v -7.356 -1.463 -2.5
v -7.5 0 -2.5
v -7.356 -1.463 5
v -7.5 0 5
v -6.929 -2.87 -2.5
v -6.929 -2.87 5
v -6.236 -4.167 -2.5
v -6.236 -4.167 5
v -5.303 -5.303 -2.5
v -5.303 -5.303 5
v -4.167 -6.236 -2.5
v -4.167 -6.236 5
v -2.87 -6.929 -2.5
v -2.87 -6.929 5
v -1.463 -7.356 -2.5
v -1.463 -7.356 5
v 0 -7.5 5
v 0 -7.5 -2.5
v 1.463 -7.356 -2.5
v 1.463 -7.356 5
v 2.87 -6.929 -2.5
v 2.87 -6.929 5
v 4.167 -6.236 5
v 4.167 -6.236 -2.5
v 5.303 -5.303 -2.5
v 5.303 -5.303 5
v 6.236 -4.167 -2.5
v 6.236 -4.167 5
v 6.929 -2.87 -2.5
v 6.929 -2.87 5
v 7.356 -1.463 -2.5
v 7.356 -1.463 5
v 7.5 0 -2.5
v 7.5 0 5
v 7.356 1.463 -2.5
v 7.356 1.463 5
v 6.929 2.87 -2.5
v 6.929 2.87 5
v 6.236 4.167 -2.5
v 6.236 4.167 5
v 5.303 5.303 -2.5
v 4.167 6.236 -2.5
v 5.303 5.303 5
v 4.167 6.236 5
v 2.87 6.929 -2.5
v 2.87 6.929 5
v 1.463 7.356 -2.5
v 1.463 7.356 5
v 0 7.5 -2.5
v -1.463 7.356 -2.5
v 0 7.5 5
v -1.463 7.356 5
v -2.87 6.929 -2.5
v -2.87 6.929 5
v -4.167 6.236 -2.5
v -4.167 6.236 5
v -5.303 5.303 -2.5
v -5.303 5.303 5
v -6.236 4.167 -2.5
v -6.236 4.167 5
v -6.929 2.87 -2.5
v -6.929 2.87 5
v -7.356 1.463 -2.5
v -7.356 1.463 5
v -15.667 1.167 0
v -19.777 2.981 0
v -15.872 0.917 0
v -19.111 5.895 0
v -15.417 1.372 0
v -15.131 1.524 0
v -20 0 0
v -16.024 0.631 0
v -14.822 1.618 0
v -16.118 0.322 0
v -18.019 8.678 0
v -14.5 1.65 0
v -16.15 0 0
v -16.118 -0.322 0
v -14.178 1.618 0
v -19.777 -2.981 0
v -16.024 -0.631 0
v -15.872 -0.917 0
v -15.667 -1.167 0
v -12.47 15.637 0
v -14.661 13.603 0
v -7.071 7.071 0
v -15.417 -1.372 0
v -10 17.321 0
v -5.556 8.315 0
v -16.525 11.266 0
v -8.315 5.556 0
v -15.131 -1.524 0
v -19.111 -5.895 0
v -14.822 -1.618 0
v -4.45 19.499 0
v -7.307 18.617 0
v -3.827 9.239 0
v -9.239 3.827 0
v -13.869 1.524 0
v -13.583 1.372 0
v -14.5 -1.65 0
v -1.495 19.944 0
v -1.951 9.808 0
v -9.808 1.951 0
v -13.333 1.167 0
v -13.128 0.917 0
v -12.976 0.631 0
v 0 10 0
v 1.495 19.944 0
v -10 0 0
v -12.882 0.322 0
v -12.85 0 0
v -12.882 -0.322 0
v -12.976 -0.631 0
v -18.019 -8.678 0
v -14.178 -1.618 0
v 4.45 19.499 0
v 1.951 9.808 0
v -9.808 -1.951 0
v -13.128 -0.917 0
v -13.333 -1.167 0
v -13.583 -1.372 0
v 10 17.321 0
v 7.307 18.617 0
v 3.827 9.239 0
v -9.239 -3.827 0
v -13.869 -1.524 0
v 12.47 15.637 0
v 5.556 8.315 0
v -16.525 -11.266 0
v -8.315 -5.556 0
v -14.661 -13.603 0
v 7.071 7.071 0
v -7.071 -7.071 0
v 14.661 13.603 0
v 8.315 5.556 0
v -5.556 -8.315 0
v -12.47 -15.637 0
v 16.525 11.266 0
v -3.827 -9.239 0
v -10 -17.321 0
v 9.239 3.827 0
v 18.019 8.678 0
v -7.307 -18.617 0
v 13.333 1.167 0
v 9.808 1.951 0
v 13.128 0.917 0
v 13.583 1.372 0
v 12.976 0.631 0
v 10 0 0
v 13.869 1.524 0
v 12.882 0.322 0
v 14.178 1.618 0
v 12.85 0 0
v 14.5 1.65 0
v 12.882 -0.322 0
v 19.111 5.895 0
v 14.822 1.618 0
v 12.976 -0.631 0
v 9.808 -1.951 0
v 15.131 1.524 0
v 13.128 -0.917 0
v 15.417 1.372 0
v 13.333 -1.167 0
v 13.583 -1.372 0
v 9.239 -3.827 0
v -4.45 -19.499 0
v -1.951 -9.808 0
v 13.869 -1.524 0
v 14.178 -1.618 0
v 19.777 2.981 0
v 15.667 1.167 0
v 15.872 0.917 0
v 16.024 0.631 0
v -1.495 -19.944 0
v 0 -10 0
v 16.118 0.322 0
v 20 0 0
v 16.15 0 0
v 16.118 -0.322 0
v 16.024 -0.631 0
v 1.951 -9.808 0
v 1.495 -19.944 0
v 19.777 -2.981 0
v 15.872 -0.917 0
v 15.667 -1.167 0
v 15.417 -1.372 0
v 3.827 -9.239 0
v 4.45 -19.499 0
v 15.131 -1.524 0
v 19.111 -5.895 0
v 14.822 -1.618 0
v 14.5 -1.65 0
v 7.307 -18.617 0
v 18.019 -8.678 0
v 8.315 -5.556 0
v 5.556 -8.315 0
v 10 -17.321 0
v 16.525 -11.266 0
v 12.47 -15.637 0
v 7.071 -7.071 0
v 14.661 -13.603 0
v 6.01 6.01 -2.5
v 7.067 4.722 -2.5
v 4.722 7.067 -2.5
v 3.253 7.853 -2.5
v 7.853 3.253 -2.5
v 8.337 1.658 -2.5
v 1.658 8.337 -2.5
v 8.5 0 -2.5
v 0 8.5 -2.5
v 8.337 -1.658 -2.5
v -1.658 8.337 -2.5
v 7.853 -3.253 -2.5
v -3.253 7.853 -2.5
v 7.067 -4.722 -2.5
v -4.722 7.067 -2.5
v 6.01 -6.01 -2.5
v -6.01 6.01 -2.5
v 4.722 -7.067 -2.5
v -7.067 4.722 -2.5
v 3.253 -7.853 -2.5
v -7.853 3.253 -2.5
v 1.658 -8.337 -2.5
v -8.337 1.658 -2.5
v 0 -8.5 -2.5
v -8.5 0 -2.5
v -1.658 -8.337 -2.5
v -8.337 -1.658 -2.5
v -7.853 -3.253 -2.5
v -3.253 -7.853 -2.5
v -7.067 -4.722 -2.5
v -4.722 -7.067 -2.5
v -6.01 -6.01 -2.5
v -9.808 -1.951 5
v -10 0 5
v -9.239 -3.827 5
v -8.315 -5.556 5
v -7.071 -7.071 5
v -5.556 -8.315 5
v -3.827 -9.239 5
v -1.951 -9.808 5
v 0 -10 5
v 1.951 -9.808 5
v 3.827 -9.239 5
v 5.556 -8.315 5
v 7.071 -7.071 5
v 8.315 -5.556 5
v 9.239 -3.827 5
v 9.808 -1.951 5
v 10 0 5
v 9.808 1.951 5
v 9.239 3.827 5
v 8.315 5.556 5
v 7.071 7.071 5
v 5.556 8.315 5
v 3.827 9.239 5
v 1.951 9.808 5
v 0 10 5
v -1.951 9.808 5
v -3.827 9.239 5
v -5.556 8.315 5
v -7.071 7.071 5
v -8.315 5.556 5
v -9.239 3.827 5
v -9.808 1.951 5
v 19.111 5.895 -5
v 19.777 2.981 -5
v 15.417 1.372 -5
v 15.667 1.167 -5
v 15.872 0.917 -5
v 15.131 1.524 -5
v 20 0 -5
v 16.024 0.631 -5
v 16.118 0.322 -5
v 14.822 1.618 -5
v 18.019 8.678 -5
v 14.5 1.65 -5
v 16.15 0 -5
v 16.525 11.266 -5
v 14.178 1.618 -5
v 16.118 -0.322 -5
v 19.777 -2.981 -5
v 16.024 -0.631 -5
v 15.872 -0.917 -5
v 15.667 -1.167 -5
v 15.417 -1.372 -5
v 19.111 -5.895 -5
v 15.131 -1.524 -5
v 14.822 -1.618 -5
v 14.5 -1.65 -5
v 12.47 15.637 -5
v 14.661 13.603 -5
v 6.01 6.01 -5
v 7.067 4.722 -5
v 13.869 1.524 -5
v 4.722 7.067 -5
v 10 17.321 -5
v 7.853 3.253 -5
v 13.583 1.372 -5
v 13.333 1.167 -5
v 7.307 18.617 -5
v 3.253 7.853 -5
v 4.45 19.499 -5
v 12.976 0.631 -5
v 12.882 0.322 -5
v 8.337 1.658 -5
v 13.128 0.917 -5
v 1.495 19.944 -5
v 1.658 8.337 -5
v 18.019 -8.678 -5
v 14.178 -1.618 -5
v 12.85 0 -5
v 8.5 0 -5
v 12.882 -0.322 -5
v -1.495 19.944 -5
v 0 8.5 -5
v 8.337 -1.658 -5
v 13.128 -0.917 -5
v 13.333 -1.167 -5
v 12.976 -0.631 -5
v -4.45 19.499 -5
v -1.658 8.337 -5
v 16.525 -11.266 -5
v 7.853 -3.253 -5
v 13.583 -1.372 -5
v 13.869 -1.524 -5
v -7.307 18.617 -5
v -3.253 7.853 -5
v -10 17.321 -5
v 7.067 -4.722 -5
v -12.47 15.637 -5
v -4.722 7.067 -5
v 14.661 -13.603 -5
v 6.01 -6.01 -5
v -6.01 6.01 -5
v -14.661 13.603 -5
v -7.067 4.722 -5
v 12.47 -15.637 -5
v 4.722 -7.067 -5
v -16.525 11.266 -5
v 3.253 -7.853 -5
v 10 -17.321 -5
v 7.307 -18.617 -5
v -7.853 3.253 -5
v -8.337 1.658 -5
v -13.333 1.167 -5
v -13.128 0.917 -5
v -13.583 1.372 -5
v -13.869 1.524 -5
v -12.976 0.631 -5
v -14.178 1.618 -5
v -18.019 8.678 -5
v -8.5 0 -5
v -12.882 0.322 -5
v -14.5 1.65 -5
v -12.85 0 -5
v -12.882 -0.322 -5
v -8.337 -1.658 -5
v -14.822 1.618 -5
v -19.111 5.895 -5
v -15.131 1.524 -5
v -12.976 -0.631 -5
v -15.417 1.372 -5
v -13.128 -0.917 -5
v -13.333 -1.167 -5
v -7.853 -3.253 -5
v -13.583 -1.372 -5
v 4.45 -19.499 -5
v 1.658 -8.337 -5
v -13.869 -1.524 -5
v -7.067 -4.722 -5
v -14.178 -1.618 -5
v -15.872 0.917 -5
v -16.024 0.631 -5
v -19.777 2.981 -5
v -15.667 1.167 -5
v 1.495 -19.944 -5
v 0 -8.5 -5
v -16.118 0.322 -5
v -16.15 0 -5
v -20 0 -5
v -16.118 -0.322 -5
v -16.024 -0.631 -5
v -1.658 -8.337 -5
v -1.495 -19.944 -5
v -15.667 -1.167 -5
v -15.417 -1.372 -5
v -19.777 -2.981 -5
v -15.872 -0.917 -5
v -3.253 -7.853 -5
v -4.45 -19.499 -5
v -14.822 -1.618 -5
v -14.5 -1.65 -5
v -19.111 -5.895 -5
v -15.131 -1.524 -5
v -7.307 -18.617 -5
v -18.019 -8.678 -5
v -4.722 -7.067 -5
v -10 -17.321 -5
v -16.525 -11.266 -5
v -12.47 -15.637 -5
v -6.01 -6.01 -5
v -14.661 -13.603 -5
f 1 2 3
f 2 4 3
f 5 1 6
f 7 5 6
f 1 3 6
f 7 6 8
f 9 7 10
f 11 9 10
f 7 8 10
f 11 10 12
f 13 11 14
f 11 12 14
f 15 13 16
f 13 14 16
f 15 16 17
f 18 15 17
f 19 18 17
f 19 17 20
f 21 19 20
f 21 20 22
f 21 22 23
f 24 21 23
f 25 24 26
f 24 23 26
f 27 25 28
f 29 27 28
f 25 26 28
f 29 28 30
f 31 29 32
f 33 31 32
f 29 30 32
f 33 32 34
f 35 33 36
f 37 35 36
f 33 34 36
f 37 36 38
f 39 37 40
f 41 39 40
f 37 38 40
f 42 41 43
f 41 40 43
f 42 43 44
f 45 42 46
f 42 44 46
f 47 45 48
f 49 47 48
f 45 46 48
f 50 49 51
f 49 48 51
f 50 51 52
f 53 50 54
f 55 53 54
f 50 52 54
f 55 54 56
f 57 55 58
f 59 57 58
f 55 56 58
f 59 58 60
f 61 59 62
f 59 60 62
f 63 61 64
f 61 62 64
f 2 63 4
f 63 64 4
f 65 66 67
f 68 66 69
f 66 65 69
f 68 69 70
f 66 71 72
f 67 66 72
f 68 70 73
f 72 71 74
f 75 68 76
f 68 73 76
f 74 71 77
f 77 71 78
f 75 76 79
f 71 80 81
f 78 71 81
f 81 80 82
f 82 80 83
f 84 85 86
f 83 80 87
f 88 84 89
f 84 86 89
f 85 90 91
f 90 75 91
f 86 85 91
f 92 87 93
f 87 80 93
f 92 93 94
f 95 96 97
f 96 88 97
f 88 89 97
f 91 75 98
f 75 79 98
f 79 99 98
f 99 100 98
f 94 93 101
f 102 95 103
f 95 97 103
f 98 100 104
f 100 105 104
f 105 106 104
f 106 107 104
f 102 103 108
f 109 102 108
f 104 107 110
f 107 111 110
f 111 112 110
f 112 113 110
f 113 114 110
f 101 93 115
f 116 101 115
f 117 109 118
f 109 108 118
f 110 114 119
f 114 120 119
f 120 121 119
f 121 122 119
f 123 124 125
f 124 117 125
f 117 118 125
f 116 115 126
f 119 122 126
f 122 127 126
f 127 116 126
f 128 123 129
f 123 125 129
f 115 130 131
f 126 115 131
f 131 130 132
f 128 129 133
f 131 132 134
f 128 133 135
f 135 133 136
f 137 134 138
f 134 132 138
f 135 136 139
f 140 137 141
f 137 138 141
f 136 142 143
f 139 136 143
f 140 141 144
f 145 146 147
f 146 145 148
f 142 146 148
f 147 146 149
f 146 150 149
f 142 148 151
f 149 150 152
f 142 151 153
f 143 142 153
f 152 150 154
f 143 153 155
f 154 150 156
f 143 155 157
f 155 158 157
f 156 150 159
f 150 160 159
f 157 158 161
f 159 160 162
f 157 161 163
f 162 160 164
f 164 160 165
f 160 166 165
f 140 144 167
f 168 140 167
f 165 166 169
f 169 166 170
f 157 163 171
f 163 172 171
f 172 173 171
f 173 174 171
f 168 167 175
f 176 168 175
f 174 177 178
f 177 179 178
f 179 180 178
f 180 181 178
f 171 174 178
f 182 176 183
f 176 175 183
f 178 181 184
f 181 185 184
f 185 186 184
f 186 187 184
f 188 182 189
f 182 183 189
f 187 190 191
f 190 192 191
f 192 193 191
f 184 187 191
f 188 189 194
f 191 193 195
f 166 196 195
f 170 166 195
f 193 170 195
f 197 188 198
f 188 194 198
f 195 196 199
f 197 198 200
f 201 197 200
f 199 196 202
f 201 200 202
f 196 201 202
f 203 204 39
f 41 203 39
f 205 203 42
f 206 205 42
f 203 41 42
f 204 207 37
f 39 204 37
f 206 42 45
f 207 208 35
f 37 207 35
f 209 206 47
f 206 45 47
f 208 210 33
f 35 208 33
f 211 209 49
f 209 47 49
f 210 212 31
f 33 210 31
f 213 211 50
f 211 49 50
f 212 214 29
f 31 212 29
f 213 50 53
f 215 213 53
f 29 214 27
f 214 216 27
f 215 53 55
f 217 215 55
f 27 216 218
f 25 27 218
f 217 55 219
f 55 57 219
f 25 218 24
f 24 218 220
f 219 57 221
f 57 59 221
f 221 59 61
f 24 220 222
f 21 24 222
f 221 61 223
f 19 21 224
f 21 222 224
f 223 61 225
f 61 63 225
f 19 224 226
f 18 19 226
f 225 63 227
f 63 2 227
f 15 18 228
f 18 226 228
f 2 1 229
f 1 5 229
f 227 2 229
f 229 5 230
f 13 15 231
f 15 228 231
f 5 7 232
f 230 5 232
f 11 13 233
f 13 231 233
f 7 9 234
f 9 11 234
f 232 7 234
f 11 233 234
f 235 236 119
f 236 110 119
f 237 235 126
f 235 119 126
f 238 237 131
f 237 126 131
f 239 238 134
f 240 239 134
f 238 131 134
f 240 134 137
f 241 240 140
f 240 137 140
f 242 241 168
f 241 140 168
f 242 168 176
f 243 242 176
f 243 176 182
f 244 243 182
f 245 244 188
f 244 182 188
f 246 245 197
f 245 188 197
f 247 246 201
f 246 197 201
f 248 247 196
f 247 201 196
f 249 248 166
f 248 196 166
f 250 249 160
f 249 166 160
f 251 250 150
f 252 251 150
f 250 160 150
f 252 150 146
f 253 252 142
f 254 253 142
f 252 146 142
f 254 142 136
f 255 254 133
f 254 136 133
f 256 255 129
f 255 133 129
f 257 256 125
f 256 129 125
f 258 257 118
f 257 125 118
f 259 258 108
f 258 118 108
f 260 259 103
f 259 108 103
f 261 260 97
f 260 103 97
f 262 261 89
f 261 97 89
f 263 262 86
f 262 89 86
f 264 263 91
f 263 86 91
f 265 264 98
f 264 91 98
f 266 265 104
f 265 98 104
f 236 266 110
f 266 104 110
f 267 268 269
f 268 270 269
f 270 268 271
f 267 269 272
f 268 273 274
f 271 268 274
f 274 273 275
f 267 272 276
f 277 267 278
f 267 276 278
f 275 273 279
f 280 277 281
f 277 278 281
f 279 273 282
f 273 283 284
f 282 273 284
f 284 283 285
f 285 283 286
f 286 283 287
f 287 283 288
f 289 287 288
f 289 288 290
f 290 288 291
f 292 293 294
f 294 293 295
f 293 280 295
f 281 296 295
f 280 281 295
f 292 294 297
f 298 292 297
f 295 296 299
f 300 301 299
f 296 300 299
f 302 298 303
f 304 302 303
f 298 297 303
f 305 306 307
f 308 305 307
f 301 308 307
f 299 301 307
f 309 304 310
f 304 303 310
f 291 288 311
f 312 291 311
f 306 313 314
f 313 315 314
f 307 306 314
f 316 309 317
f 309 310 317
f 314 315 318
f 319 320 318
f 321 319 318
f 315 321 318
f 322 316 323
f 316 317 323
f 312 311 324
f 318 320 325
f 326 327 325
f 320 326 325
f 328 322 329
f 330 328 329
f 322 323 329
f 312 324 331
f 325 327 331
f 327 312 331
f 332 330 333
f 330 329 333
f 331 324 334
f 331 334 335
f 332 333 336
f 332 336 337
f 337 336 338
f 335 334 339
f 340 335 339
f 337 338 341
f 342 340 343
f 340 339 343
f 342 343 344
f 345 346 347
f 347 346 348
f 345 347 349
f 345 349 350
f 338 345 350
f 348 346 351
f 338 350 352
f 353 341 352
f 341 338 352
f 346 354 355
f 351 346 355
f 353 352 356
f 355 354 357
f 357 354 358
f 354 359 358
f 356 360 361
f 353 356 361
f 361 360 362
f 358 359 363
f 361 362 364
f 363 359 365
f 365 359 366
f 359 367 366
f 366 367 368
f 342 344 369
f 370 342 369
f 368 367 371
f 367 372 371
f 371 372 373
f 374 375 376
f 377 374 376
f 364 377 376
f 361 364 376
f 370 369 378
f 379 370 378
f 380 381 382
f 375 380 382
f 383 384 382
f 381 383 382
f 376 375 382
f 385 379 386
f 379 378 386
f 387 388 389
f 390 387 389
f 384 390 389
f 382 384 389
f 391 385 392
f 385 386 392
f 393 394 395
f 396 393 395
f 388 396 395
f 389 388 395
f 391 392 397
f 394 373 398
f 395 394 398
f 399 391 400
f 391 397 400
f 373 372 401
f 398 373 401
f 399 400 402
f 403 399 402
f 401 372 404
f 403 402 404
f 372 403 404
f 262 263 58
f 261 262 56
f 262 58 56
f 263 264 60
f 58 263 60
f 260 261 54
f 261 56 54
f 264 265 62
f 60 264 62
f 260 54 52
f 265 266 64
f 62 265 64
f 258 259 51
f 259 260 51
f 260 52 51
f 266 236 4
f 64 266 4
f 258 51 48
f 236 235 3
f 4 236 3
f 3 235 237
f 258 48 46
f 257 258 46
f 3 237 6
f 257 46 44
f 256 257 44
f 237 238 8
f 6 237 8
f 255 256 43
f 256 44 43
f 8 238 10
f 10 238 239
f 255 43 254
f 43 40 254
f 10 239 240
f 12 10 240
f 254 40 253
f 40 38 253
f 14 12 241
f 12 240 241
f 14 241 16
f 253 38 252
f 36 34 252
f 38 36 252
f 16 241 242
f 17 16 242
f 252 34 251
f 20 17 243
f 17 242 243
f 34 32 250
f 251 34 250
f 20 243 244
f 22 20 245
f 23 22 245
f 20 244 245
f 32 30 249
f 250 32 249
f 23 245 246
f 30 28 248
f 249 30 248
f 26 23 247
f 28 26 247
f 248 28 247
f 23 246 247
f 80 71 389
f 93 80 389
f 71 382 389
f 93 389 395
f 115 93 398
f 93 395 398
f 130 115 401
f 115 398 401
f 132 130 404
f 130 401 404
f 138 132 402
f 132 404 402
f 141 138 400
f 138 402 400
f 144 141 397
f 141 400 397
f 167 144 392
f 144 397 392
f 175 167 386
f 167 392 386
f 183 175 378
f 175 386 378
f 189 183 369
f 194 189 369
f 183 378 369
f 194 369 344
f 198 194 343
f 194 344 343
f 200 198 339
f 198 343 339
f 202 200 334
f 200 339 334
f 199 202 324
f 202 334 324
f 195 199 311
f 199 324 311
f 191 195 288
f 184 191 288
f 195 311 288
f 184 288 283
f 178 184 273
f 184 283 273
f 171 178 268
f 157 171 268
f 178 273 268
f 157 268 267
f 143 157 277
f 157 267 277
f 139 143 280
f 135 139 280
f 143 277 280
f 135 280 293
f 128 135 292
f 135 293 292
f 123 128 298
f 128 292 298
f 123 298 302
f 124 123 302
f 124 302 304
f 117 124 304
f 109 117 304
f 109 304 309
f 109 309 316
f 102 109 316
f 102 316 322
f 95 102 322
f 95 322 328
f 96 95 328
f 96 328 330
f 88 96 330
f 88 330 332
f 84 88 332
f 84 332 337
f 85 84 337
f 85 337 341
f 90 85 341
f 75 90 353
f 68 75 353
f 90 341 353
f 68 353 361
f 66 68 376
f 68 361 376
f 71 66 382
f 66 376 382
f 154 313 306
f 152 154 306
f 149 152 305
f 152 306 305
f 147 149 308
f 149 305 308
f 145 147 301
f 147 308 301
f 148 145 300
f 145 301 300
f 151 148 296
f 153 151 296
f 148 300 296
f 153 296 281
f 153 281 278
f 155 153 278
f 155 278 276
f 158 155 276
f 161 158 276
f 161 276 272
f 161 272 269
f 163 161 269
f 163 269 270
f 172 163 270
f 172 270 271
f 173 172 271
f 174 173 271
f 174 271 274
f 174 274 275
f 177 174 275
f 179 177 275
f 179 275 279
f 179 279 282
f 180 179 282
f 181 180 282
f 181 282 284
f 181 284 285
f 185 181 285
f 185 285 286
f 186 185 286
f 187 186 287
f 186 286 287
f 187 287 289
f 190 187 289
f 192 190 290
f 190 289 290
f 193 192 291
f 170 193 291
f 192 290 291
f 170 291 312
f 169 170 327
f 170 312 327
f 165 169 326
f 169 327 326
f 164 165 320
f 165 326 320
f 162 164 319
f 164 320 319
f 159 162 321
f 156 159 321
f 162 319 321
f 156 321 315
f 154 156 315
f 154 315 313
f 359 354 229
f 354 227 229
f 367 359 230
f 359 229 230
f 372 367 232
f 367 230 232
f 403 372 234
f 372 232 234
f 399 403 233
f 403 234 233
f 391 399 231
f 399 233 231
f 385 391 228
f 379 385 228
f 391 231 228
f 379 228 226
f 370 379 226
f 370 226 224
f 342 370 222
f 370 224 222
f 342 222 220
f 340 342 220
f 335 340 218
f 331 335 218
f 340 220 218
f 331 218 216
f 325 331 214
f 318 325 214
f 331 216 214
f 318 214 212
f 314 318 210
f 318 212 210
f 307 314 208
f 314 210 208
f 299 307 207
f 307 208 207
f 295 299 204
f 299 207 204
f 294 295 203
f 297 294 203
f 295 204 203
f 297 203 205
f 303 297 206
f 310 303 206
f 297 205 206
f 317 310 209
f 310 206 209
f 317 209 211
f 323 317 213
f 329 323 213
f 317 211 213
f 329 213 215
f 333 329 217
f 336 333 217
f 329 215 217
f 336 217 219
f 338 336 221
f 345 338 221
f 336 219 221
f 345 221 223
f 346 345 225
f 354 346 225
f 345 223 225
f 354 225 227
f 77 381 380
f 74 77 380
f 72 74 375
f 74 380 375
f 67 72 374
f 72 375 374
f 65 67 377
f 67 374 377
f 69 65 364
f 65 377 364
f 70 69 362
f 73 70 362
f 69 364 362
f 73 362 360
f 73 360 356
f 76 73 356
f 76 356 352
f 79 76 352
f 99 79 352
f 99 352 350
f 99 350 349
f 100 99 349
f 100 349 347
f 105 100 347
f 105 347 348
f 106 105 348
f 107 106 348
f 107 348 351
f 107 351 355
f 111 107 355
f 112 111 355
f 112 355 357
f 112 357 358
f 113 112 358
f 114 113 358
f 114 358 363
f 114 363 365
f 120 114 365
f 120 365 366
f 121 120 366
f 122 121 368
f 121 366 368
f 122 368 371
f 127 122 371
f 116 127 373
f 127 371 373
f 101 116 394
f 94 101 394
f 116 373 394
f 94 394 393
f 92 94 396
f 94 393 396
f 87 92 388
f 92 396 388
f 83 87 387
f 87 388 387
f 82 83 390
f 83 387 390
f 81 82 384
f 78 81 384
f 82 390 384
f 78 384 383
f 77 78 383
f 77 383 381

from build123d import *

# Parameters (mm, degrees)
M4X0_7_TAPPED_HOLE1_D = 3.3


with BuildPart() as part:
    # Sketch2 → Revolve1 (revolve)
    with BuildSketch(Plane(origin=(0, 0, 0), x_dir=(1, 0, 0), z_dir=(0, 1, 0)), mode=Mode.PRIVATE) as revolve1_sk:
        Polygon((7.5, -5), (10, -5), (10, 0), (20, 0), (20, 5), (8.5, 5), (8.5, 2.5), (7.5, 2.5), align=None)
    revolve(revolve1_sk.sketch.rotate(Axis((0, 0, -17.379705215), (0, 0, 1)), 180), axis=Axis((0, 0, -17.379705215), (0, 0, 1)))

    # M4x0.7 Tapped Hole1 (through all)
    with Locations(Plane.XY):
        with Locations((-14.5, 0), (14.5, 0)):
            Hole(M4X0_7_TAPPED_HOLE1_D / 2)


solid = part.part
